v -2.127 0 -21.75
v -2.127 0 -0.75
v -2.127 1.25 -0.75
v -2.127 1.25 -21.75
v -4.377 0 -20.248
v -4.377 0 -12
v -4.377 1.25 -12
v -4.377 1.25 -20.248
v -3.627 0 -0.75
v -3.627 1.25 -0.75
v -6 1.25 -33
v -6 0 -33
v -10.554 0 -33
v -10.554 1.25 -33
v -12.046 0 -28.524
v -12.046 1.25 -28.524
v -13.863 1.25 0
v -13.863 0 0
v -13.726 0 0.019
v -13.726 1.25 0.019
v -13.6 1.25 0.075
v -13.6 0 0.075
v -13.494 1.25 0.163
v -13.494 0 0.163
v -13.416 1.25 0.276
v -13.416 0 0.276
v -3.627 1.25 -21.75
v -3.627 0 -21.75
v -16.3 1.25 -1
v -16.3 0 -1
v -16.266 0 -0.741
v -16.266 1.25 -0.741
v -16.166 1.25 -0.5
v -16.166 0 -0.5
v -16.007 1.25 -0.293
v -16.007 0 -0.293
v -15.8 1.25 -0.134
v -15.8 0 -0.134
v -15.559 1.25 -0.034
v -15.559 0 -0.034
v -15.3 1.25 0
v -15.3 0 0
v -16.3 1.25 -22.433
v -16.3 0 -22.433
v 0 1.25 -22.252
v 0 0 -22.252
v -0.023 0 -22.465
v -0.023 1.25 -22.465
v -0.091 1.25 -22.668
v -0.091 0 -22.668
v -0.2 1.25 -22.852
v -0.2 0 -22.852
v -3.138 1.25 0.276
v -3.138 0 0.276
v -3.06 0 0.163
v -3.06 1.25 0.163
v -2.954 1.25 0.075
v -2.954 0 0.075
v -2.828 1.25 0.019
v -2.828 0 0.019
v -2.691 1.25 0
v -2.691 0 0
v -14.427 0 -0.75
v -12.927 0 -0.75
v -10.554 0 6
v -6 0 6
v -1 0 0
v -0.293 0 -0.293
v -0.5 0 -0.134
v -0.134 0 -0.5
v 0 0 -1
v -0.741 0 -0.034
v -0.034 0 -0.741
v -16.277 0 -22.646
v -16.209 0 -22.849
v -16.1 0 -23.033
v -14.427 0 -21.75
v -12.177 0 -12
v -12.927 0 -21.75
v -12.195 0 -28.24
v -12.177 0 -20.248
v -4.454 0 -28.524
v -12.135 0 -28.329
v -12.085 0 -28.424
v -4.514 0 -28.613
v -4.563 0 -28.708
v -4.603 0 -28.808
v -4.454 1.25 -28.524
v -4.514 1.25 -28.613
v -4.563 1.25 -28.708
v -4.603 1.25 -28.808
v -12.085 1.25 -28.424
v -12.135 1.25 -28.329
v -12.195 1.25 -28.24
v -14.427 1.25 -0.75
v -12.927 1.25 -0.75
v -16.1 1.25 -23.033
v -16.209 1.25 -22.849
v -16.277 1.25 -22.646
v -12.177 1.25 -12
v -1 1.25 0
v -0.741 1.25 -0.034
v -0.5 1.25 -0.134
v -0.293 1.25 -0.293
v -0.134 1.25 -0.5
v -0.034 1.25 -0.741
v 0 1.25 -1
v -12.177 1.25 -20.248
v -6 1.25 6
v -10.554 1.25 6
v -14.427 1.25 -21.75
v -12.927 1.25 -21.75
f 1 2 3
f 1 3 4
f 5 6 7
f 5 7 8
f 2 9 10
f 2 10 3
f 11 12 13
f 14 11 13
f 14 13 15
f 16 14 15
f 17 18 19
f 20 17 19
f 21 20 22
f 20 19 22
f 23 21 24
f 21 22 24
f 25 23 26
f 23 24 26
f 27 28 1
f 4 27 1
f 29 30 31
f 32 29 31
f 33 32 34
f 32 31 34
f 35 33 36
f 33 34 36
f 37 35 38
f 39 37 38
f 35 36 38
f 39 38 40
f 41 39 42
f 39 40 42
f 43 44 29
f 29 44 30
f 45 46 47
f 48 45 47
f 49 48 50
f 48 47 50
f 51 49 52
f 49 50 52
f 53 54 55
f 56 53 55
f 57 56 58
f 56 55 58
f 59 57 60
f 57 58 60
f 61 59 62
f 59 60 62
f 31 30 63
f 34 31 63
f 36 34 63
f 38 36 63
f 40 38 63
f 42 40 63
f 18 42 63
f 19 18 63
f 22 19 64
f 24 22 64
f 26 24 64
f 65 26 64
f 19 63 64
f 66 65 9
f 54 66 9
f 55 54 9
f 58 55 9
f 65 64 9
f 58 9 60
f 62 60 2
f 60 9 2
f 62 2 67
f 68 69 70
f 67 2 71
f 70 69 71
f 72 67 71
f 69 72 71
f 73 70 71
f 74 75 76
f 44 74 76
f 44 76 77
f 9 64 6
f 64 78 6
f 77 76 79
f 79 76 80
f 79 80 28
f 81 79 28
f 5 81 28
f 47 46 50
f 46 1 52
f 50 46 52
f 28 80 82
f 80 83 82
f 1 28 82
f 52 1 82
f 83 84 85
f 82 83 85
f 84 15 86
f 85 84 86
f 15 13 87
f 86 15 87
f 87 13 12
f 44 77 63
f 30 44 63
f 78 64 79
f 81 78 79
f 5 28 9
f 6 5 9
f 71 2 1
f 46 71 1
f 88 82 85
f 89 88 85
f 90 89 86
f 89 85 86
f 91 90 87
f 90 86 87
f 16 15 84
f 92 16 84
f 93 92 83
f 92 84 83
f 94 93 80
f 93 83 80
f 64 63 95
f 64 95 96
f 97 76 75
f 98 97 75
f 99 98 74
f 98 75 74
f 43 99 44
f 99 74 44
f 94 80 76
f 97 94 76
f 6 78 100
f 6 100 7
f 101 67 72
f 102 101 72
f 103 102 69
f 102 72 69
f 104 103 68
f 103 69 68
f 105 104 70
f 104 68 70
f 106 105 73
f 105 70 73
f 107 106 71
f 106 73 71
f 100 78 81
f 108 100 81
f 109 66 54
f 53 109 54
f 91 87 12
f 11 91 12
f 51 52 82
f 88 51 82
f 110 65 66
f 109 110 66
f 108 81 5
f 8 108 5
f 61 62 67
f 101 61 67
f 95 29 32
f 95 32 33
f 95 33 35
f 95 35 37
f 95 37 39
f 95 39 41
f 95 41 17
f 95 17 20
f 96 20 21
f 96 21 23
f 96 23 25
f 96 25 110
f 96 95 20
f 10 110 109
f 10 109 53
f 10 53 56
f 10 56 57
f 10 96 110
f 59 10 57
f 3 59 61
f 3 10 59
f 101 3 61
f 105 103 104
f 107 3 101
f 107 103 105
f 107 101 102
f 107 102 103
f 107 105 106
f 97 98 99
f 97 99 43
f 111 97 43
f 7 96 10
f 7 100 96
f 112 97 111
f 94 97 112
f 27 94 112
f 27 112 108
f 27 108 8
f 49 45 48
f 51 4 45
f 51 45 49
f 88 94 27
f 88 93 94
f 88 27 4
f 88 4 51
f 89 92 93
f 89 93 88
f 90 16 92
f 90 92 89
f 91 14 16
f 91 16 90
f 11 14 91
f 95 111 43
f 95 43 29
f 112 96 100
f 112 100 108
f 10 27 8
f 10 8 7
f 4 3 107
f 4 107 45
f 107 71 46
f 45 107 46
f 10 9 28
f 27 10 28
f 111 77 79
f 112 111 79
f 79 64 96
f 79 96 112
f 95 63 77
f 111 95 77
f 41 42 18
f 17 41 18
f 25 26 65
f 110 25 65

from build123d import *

# Parameters (mm, degrees)
SKETCH1_W           = 1.5
SKETCH1_H           = 21
SKETCH1_W_2         = 7.8
SKETCH1_H_2         = 8.247795839
BOSS_EXTRUDE1_DEPTH = 1.25


with BuildPart() as part:
    # Sketch1 → Boss-Extrude1 (new body)
    with BuildSketch(Plane(origin=(0, 0, 0), x_dir=(1, 0, 0), z_dir=(0, 1, 0))):
        with BuildLine():
            Line((0, 1), (0, 22.252194503))
            ThreePointArc((0, 22.252194503), (-0.051316702, 22.568422269), (-0.2, 22.852194503))
            Line((-0.2, 22.852194503), (-4.453950106, 28.524127978))
            ThreePointArc((-4.453950106, 28.524127978), (-4.539729418, 28.660021298), (-4.602633404, 28.807900212))
            Line((-4.602633404, 28.807900212), (-6, 33))
            Line((-6, 33), (-10.554092553, 33))
            Line((-10.554092553, 33), (-12.046049894, 28.524127978))
            ThreePointArc((-12.046049894, 28.524127978), (-12.10895388, 28.376249064), (-12.194733192, 28.240355744))
            Line((-12.194733192, 28.240355744), (-16.1, 23.033333333))
            ThreePointArc((-16.1, 23.033333333), (-16.248683298, 22.749561099), (-16.3, 22.433333333))
            Line((-16.3, 22.433333333), (-16.3, 1))
            ThreePointArc((-16.3, 1), (-16.007106781, 0.292893219), (-15.3, 0))
            Line((-15.3, 0), (-13.863109548, 0))
            ThreePointArc((-13.863109548, 0), (-13.600243992, -0.074674596), (-13.415895952, -0.276393202))
            Line((-13.415895952, -0.276393202), (-10.554092553, -6))
            Line((-10.554092553, -6), (-6, -6))
            Line((-6, -6), (-3.138196601, -0.276393202))
            ThreePointArc((-3.138196601, -0.276393202), (-2.953848562, -0.074674596), (-2.690983006, 0))
            Line((-2.690983006, 0), (-1, 0))
            ThreePointArc((-1, 0), (-0.292893219, 0.292893219), (0, 1))
        make_face()
        with Locations((-13.677046277, 11.25)):
            Rectangle(SKETCH1_W, SKETCH1_H, mode=Mode.SUBTRACT)
        with Locations((-2.877046277, 11.25)):
            Rectangle(SKETCH1_W, SKETCH1_H, mode=Mode.SUBTRACT)
        with Locations((-8.277046277, 16.12389792)):
            Rectangle(SKETCH1_W_2, SKETCH1_H_2, mode=Mode.SUBTRACT)
    extrude(amount=BOSS_EXTRUDE1_DEPTH)


solid = part.part
